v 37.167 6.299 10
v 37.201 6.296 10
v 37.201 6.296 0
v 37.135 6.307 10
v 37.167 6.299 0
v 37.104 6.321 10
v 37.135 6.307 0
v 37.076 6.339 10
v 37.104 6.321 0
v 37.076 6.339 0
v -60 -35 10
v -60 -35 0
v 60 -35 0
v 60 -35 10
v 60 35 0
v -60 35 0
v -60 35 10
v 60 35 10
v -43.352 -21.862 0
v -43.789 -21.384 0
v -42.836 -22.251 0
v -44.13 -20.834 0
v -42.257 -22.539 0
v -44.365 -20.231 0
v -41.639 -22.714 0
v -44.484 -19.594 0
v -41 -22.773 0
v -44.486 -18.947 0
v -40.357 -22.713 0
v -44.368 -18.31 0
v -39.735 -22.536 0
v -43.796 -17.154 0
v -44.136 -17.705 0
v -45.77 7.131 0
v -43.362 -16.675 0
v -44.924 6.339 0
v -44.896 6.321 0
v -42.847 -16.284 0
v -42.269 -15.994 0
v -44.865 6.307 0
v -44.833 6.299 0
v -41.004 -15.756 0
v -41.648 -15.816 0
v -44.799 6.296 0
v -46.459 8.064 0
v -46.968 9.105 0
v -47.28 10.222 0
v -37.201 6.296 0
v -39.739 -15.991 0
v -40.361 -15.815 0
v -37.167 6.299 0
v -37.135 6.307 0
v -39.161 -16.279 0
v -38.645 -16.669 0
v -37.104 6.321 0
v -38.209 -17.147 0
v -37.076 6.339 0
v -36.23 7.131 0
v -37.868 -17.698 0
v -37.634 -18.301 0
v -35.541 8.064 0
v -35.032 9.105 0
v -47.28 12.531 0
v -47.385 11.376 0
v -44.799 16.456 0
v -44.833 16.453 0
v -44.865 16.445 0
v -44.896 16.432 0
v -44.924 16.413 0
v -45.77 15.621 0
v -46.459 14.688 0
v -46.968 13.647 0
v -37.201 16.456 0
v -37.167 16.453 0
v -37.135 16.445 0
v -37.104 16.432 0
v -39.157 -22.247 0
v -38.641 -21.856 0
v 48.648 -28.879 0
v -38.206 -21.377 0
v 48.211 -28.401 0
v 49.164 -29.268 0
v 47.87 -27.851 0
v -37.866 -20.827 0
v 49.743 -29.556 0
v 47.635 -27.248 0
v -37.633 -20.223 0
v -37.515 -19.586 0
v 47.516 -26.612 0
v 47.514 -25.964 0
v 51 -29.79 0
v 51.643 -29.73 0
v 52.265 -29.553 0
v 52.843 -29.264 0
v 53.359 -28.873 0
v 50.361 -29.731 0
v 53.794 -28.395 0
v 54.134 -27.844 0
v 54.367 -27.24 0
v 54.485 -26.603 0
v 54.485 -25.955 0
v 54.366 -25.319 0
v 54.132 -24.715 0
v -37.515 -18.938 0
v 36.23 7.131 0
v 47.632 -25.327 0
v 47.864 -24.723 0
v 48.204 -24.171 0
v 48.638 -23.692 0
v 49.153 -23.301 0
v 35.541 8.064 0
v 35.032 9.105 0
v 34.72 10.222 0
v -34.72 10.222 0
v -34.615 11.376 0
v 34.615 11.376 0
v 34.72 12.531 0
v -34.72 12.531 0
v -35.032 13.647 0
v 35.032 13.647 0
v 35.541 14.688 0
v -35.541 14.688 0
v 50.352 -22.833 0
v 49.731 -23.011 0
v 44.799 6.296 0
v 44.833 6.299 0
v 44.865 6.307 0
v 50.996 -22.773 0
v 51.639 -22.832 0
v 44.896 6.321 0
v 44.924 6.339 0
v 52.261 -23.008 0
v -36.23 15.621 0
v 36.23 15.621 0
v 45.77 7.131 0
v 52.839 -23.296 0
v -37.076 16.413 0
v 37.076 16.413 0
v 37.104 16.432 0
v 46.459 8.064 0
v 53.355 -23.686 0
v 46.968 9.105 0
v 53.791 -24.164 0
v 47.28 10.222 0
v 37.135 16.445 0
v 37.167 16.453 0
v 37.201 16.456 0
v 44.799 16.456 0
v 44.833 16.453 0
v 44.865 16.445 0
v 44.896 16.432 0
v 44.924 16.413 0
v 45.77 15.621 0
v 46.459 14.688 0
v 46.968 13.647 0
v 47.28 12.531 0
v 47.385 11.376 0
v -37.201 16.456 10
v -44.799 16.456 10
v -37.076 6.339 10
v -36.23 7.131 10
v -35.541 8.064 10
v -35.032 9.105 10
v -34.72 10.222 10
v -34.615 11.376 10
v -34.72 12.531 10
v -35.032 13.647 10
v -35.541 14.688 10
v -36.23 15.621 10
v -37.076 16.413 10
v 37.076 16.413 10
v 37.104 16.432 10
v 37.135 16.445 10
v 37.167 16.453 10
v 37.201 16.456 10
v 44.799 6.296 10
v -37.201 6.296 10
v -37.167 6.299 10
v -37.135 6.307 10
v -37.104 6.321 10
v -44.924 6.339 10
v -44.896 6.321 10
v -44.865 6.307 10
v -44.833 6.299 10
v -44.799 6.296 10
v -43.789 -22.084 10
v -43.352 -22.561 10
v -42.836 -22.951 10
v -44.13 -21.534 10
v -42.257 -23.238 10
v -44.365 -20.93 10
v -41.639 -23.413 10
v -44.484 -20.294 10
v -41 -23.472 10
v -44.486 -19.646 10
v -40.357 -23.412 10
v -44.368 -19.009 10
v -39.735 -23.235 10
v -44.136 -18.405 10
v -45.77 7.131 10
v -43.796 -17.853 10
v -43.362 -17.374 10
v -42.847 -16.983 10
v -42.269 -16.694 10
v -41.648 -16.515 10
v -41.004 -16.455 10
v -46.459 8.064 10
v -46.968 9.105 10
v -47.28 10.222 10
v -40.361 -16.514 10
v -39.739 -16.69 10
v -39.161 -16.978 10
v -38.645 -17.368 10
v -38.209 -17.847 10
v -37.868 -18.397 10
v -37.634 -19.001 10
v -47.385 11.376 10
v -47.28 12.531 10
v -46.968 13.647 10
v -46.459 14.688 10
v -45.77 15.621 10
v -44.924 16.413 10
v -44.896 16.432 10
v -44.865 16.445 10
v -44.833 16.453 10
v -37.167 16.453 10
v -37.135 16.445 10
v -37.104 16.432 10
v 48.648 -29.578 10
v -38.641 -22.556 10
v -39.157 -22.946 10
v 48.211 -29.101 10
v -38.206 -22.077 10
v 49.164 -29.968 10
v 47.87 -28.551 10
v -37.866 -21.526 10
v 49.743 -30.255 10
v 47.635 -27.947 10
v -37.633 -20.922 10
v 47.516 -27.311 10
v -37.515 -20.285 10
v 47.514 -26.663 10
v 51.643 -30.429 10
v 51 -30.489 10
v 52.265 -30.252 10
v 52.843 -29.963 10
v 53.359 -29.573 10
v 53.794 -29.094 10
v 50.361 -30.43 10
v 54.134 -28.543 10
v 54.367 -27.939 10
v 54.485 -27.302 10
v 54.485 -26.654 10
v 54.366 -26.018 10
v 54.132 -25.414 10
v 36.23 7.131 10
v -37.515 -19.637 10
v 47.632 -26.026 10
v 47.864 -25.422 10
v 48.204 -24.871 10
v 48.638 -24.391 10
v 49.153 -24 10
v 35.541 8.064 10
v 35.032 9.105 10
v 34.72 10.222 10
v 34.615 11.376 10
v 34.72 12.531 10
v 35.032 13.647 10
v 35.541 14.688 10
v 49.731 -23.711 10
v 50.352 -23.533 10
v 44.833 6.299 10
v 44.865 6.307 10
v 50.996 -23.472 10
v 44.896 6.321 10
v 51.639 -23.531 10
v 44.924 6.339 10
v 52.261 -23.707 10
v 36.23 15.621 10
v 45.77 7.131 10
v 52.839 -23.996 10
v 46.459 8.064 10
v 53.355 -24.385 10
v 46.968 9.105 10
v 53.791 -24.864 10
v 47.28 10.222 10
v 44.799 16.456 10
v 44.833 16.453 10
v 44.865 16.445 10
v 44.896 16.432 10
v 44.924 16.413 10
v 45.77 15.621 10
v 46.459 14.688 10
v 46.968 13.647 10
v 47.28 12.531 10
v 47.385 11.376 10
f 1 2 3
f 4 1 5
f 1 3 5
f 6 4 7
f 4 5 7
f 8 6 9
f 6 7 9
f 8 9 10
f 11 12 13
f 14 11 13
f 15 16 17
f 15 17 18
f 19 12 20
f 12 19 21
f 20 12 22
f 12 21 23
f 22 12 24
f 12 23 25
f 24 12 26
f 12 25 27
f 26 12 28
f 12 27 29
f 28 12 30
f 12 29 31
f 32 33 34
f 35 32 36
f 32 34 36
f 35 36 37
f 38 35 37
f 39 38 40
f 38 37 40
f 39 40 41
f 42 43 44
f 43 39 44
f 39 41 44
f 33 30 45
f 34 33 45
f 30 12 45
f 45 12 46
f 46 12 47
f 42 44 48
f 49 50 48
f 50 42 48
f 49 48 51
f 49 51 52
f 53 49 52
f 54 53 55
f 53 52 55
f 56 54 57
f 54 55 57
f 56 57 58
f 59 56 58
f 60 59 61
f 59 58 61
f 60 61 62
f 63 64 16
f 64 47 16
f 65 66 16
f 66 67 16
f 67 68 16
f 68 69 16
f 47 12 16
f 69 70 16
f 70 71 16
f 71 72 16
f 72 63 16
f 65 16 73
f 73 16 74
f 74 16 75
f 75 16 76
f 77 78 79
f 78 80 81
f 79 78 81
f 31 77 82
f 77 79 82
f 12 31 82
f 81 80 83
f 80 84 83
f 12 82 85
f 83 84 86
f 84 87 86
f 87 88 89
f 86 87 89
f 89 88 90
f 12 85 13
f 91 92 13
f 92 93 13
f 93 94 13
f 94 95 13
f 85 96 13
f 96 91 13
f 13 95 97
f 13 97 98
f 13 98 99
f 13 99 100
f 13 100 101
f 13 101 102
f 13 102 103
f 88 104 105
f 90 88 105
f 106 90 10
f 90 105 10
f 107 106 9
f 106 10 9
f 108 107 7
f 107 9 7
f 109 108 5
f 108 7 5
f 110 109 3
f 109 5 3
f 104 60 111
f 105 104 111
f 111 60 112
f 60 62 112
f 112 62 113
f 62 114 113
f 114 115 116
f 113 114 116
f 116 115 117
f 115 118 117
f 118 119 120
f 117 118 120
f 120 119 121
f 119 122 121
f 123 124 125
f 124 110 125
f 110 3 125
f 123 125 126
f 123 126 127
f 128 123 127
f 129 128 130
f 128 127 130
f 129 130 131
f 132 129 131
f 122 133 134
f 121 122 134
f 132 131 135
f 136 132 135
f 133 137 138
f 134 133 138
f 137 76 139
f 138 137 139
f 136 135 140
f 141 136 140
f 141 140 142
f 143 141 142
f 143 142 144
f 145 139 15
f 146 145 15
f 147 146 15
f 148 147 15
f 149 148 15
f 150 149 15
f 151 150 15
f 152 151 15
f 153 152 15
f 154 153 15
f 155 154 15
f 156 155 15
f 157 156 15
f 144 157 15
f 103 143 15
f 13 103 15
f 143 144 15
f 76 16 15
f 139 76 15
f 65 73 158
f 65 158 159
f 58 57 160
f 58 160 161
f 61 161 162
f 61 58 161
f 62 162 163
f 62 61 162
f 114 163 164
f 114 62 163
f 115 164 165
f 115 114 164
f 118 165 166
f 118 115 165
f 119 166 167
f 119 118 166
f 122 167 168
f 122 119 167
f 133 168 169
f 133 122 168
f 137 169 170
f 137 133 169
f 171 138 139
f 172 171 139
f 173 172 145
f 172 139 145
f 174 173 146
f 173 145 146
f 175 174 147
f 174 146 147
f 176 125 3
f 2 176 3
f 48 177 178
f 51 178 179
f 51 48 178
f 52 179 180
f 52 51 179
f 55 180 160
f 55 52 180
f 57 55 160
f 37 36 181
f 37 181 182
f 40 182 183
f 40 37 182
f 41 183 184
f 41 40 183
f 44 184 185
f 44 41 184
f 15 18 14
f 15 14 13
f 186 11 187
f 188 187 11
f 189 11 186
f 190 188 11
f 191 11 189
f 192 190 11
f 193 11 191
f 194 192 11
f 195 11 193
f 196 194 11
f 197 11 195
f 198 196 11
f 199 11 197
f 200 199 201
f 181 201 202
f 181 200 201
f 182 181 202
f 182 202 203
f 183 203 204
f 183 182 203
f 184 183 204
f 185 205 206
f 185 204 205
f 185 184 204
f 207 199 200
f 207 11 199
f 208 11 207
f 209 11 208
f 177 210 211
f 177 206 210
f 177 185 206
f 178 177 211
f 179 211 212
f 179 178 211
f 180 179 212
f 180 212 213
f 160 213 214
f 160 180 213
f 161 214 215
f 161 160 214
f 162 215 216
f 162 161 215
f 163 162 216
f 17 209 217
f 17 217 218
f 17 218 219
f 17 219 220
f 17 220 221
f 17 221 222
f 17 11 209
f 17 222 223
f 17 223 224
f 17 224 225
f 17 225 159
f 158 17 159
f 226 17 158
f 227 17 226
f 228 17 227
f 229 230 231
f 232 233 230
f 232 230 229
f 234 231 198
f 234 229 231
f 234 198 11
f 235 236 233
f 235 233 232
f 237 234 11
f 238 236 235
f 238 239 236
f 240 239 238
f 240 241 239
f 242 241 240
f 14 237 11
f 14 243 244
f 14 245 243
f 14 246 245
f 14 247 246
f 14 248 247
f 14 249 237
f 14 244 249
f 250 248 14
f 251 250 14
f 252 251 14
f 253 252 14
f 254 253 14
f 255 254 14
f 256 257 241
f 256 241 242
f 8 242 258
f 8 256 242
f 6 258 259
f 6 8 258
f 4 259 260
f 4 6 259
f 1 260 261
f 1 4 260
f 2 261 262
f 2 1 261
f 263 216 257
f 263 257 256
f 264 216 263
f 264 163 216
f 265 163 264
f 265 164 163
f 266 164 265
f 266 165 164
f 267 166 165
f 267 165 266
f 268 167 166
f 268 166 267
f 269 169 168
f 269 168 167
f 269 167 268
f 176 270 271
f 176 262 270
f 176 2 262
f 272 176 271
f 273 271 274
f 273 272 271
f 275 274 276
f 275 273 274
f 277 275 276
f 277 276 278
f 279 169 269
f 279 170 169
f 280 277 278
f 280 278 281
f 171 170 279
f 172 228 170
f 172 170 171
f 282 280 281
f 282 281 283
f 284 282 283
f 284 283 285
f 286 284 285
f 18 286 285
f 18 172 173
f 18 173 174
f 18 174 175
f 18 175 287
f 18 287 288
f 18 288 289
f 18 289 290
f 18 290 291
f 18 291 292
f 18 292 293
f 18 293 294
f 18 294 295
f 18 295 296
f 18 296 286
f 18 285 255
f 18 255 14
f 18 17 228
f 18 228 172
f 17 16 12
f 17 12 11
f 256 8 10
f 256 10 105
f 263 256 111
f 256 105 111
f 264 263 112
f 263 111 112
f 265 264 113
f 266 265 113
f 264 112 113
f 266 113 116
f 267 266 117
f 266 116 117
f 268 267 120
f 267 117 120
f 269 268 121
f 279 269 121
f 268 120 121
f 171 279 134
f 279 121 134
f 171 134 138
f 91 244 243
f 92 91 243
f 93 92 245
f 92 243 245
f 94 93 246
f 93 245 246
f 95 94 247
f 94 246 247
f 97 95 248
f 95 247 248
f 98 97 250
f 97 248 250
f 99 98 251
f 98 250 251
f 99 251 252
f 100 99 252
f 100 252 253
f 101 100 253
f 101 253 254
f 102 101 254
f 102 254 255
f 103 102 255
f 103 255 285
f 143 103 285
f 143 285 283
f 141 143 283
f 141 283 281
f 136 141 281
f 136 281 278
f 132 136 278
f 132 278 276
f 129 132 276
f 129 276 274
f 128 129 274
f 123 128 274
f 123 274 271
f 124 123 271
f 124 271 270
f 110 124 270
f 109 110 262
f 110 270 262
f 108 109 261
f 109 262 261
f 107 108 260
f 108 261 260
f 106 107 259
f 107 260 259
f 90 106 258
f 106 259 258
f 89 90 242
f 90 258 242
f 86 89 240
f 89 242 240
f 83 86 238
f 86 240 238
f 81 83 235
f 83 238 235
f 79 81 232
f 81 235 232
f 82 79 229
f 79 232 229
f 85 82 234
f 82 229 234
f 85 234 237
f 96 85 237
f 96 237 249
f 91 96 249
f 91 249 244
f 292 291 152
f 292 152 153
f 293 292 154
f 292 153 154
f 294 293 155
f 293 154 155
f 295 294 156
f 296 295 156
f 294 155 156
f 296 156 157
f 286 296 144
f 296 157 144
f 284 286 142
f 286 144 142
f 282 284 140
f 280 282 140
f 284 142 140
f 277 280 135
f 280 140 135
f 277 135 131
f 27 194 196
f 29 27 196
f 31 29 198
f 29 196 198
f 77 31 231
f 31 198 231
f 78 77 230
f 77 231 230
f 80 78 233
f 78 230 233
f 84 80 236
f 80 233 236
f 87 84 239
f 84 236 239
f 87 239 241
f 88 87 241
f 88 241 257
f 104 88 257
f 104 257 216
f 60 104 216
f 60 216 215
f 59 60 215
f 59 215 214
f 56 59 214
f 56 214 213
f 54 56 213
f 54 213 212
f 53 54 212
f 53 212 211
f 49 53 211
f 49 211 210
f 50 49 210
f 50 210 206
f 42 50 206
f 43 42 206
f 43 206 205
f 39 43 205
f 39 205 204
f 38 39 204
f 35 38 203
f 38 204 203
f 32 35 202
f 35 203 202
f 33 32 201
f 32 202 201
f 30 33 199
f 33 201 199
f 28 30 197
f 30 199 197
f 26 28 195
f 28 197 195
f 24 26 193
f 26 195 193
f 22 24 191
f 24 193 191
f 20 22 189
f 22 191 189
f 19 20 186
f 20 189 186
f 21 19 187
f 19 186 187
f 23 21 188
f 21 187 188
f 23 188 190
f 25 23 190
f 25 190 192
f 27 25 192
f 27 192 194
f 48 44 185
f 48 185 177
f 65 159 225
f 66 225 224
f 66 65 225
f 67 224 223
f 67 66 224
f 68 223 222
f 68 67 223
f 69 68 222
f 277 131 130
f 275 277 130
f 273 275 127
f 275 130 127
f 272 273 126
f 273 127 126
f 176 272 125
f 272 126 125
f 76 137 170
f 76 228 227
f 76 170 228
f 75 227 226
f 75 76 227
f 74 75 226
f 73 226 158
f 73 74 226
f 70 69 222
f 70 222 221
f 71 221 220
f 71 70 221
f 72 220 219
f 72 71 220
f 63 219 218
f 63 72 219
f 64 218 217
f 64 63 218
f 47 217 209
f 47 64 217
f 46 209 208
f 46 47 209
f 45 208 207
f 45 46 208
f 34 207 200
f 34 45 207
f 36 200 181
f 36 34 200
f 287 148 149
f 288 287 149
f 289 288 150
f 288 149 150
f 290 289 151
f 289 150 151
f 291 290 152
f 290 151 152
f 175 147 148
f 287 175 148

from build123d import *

# Parameters (mm, degrees)
SKETCH1_W           = 140
SKETCH1_H           = 70
BOSS_EXTRUDE1_DEPTH = 10
CUT_EXTRUDE1_DEPTH  = 79.89866919
SKETCH3_W           = 10
SKETCH3_H           = 70
CUT_EXTRUDE2_DEPTH  = 10
SKETCH4_W           = 10
SKETCH4_H           = 70
CUT_EXTRUDE3_DEPTH  = 10
SKETCH5_R           = 3.5
CUT_EXTRUDE4_DEPTH  = 71.99166851


with BuildPart() as part:
    # Sketch1 → Boss-Extrude1 (new body)
    with BuildSketch(Plane.XY):
        Rectangle(SKETCH1_W, SKETCH1_H)
    extrude(amount=BOSS_EXTRUDE1_DEPTH)

    # Sketch2 → Cut-Extrude1 (cut, through all)
    with BuildSketch(Plane(origin=(0, 0, 0), x_dir=(-1, 0, 0), z_dir=(0, 0, -1))):
        with BuildLine():
            Line((-44.799329863, 6.296119908), (-37.200670137, 6.296119908))
            ThreePointArc((-37.200670137, 6.296119908), (-37.134647488, 6.307144858), (-37.075789173, 6.339023354))
            ThreePointArc((-37.075789173, 6.339023354), (-34.614722222, 11.376119908), (-37.075789173, 16.413216461))
            ThreePointArc((-37.075789173, 16.413216461), (-37.134647488, 16.445094958), (-37.200670137, 16.456119908))
            Line((-37.200670137, 16.456119908), (-44.799329863, 16.456119908))
            ThreePointArc((-44.799329863, 16.456119908), (-44.865352512, 16.445094958), (-44.924210827, 16.413216461))
            ThreePointArc((-44.924210827, 16.413216461), (-47.385277778, 11.376119908), (-44.924210827, 6.339023354))
            ThreePointArc((-44.924210827, 6.339023354), (-44.865352512, 6.307144858), (-44.799329863, 6.296119908))
        make_face()
        with BuildLine():
            Line((37.200670137, 16.456119908), (44.799329863, 16.456119908))
            ThreePointArc((44.799329863, 16.456119908), (44.865352512, 16.445094958), (44.924210827, 16.413216461))
            ThreePointArc((44.924210827, 16.413216461), (47.385277778, 11.376119908), (44.924210827, 6.339023354))
            ThreePointArc((44.924210827, 6.339023354), (44.865352512, 6.307144858), (44.799329863, 6.296119908))
            Line((44.799329863, 6.296119908), (37.200670137, 6.296119908))
            ThreePointArc((37.200670137, 6.296119908), (37.134647488, 6.307144858), (37.075789173, 6.339023354))
            ThreePointArc((37.075789173, 6.339023354), (34.614722222, 11.376119908), (37.075789173, 16.413216461))
            ThreePointArc((37.075789173, 16.413216461), (37.134647488, 16.445094958), (37.200670137, 16.456119908))
        make_face()
    extrude(amount=-CUT_EXTRUDE1_DEPTH, mode=Mode.SUBTRACT)

    # Sketch3 → Cut-Extrude2 (cut)
    with BuildSketch(Plane(origin=(70, 0, 0), x_dir=(0, 0, -1), z_dir=(1, 0, 0))):
        with Locations((-5, 0)):
            Rectangle(SKETCH3_W, SKETCH3_H)
    extrude(amount=-CUT_EXTRUDE2_DEPTH, mode=Mode.SUBTRACT)

    # Sketch4 → Cut-Extrude3 (cut)
    with BuildSketch(Plane.ZY.offset(70)):
        with Locations((5, 0)):
            Rectangle(SKETCH4_W, SKETCH4_H)
    extrude(amount=-CUT_EXTRUDE3_DEPTH, mode=Mode.SUBTRACT)

    # Sketch5 → Cut-Extrude4 (cut, through all)
    with BuildSketch(Plane(origin=(0, -0.866174302, 12.386869611), x_dir=(1, 0, 0), z_dir=(0, -0.06975647374412544, 0.9975640502598242))):
        with Locations(Location((51, -26.217177022, 0), (0, 0, 270))):
            Circle(SKETCH5_R)
        with Locations(Location((-41, -19.217177022, 0), (0, 0, 270))):
            Circle(SKETCH5_R)
    extrude(amount=-CUT_EXTRUDE4_DEPTH, mode=Mode.SUBTRACT)


solid = part.part
